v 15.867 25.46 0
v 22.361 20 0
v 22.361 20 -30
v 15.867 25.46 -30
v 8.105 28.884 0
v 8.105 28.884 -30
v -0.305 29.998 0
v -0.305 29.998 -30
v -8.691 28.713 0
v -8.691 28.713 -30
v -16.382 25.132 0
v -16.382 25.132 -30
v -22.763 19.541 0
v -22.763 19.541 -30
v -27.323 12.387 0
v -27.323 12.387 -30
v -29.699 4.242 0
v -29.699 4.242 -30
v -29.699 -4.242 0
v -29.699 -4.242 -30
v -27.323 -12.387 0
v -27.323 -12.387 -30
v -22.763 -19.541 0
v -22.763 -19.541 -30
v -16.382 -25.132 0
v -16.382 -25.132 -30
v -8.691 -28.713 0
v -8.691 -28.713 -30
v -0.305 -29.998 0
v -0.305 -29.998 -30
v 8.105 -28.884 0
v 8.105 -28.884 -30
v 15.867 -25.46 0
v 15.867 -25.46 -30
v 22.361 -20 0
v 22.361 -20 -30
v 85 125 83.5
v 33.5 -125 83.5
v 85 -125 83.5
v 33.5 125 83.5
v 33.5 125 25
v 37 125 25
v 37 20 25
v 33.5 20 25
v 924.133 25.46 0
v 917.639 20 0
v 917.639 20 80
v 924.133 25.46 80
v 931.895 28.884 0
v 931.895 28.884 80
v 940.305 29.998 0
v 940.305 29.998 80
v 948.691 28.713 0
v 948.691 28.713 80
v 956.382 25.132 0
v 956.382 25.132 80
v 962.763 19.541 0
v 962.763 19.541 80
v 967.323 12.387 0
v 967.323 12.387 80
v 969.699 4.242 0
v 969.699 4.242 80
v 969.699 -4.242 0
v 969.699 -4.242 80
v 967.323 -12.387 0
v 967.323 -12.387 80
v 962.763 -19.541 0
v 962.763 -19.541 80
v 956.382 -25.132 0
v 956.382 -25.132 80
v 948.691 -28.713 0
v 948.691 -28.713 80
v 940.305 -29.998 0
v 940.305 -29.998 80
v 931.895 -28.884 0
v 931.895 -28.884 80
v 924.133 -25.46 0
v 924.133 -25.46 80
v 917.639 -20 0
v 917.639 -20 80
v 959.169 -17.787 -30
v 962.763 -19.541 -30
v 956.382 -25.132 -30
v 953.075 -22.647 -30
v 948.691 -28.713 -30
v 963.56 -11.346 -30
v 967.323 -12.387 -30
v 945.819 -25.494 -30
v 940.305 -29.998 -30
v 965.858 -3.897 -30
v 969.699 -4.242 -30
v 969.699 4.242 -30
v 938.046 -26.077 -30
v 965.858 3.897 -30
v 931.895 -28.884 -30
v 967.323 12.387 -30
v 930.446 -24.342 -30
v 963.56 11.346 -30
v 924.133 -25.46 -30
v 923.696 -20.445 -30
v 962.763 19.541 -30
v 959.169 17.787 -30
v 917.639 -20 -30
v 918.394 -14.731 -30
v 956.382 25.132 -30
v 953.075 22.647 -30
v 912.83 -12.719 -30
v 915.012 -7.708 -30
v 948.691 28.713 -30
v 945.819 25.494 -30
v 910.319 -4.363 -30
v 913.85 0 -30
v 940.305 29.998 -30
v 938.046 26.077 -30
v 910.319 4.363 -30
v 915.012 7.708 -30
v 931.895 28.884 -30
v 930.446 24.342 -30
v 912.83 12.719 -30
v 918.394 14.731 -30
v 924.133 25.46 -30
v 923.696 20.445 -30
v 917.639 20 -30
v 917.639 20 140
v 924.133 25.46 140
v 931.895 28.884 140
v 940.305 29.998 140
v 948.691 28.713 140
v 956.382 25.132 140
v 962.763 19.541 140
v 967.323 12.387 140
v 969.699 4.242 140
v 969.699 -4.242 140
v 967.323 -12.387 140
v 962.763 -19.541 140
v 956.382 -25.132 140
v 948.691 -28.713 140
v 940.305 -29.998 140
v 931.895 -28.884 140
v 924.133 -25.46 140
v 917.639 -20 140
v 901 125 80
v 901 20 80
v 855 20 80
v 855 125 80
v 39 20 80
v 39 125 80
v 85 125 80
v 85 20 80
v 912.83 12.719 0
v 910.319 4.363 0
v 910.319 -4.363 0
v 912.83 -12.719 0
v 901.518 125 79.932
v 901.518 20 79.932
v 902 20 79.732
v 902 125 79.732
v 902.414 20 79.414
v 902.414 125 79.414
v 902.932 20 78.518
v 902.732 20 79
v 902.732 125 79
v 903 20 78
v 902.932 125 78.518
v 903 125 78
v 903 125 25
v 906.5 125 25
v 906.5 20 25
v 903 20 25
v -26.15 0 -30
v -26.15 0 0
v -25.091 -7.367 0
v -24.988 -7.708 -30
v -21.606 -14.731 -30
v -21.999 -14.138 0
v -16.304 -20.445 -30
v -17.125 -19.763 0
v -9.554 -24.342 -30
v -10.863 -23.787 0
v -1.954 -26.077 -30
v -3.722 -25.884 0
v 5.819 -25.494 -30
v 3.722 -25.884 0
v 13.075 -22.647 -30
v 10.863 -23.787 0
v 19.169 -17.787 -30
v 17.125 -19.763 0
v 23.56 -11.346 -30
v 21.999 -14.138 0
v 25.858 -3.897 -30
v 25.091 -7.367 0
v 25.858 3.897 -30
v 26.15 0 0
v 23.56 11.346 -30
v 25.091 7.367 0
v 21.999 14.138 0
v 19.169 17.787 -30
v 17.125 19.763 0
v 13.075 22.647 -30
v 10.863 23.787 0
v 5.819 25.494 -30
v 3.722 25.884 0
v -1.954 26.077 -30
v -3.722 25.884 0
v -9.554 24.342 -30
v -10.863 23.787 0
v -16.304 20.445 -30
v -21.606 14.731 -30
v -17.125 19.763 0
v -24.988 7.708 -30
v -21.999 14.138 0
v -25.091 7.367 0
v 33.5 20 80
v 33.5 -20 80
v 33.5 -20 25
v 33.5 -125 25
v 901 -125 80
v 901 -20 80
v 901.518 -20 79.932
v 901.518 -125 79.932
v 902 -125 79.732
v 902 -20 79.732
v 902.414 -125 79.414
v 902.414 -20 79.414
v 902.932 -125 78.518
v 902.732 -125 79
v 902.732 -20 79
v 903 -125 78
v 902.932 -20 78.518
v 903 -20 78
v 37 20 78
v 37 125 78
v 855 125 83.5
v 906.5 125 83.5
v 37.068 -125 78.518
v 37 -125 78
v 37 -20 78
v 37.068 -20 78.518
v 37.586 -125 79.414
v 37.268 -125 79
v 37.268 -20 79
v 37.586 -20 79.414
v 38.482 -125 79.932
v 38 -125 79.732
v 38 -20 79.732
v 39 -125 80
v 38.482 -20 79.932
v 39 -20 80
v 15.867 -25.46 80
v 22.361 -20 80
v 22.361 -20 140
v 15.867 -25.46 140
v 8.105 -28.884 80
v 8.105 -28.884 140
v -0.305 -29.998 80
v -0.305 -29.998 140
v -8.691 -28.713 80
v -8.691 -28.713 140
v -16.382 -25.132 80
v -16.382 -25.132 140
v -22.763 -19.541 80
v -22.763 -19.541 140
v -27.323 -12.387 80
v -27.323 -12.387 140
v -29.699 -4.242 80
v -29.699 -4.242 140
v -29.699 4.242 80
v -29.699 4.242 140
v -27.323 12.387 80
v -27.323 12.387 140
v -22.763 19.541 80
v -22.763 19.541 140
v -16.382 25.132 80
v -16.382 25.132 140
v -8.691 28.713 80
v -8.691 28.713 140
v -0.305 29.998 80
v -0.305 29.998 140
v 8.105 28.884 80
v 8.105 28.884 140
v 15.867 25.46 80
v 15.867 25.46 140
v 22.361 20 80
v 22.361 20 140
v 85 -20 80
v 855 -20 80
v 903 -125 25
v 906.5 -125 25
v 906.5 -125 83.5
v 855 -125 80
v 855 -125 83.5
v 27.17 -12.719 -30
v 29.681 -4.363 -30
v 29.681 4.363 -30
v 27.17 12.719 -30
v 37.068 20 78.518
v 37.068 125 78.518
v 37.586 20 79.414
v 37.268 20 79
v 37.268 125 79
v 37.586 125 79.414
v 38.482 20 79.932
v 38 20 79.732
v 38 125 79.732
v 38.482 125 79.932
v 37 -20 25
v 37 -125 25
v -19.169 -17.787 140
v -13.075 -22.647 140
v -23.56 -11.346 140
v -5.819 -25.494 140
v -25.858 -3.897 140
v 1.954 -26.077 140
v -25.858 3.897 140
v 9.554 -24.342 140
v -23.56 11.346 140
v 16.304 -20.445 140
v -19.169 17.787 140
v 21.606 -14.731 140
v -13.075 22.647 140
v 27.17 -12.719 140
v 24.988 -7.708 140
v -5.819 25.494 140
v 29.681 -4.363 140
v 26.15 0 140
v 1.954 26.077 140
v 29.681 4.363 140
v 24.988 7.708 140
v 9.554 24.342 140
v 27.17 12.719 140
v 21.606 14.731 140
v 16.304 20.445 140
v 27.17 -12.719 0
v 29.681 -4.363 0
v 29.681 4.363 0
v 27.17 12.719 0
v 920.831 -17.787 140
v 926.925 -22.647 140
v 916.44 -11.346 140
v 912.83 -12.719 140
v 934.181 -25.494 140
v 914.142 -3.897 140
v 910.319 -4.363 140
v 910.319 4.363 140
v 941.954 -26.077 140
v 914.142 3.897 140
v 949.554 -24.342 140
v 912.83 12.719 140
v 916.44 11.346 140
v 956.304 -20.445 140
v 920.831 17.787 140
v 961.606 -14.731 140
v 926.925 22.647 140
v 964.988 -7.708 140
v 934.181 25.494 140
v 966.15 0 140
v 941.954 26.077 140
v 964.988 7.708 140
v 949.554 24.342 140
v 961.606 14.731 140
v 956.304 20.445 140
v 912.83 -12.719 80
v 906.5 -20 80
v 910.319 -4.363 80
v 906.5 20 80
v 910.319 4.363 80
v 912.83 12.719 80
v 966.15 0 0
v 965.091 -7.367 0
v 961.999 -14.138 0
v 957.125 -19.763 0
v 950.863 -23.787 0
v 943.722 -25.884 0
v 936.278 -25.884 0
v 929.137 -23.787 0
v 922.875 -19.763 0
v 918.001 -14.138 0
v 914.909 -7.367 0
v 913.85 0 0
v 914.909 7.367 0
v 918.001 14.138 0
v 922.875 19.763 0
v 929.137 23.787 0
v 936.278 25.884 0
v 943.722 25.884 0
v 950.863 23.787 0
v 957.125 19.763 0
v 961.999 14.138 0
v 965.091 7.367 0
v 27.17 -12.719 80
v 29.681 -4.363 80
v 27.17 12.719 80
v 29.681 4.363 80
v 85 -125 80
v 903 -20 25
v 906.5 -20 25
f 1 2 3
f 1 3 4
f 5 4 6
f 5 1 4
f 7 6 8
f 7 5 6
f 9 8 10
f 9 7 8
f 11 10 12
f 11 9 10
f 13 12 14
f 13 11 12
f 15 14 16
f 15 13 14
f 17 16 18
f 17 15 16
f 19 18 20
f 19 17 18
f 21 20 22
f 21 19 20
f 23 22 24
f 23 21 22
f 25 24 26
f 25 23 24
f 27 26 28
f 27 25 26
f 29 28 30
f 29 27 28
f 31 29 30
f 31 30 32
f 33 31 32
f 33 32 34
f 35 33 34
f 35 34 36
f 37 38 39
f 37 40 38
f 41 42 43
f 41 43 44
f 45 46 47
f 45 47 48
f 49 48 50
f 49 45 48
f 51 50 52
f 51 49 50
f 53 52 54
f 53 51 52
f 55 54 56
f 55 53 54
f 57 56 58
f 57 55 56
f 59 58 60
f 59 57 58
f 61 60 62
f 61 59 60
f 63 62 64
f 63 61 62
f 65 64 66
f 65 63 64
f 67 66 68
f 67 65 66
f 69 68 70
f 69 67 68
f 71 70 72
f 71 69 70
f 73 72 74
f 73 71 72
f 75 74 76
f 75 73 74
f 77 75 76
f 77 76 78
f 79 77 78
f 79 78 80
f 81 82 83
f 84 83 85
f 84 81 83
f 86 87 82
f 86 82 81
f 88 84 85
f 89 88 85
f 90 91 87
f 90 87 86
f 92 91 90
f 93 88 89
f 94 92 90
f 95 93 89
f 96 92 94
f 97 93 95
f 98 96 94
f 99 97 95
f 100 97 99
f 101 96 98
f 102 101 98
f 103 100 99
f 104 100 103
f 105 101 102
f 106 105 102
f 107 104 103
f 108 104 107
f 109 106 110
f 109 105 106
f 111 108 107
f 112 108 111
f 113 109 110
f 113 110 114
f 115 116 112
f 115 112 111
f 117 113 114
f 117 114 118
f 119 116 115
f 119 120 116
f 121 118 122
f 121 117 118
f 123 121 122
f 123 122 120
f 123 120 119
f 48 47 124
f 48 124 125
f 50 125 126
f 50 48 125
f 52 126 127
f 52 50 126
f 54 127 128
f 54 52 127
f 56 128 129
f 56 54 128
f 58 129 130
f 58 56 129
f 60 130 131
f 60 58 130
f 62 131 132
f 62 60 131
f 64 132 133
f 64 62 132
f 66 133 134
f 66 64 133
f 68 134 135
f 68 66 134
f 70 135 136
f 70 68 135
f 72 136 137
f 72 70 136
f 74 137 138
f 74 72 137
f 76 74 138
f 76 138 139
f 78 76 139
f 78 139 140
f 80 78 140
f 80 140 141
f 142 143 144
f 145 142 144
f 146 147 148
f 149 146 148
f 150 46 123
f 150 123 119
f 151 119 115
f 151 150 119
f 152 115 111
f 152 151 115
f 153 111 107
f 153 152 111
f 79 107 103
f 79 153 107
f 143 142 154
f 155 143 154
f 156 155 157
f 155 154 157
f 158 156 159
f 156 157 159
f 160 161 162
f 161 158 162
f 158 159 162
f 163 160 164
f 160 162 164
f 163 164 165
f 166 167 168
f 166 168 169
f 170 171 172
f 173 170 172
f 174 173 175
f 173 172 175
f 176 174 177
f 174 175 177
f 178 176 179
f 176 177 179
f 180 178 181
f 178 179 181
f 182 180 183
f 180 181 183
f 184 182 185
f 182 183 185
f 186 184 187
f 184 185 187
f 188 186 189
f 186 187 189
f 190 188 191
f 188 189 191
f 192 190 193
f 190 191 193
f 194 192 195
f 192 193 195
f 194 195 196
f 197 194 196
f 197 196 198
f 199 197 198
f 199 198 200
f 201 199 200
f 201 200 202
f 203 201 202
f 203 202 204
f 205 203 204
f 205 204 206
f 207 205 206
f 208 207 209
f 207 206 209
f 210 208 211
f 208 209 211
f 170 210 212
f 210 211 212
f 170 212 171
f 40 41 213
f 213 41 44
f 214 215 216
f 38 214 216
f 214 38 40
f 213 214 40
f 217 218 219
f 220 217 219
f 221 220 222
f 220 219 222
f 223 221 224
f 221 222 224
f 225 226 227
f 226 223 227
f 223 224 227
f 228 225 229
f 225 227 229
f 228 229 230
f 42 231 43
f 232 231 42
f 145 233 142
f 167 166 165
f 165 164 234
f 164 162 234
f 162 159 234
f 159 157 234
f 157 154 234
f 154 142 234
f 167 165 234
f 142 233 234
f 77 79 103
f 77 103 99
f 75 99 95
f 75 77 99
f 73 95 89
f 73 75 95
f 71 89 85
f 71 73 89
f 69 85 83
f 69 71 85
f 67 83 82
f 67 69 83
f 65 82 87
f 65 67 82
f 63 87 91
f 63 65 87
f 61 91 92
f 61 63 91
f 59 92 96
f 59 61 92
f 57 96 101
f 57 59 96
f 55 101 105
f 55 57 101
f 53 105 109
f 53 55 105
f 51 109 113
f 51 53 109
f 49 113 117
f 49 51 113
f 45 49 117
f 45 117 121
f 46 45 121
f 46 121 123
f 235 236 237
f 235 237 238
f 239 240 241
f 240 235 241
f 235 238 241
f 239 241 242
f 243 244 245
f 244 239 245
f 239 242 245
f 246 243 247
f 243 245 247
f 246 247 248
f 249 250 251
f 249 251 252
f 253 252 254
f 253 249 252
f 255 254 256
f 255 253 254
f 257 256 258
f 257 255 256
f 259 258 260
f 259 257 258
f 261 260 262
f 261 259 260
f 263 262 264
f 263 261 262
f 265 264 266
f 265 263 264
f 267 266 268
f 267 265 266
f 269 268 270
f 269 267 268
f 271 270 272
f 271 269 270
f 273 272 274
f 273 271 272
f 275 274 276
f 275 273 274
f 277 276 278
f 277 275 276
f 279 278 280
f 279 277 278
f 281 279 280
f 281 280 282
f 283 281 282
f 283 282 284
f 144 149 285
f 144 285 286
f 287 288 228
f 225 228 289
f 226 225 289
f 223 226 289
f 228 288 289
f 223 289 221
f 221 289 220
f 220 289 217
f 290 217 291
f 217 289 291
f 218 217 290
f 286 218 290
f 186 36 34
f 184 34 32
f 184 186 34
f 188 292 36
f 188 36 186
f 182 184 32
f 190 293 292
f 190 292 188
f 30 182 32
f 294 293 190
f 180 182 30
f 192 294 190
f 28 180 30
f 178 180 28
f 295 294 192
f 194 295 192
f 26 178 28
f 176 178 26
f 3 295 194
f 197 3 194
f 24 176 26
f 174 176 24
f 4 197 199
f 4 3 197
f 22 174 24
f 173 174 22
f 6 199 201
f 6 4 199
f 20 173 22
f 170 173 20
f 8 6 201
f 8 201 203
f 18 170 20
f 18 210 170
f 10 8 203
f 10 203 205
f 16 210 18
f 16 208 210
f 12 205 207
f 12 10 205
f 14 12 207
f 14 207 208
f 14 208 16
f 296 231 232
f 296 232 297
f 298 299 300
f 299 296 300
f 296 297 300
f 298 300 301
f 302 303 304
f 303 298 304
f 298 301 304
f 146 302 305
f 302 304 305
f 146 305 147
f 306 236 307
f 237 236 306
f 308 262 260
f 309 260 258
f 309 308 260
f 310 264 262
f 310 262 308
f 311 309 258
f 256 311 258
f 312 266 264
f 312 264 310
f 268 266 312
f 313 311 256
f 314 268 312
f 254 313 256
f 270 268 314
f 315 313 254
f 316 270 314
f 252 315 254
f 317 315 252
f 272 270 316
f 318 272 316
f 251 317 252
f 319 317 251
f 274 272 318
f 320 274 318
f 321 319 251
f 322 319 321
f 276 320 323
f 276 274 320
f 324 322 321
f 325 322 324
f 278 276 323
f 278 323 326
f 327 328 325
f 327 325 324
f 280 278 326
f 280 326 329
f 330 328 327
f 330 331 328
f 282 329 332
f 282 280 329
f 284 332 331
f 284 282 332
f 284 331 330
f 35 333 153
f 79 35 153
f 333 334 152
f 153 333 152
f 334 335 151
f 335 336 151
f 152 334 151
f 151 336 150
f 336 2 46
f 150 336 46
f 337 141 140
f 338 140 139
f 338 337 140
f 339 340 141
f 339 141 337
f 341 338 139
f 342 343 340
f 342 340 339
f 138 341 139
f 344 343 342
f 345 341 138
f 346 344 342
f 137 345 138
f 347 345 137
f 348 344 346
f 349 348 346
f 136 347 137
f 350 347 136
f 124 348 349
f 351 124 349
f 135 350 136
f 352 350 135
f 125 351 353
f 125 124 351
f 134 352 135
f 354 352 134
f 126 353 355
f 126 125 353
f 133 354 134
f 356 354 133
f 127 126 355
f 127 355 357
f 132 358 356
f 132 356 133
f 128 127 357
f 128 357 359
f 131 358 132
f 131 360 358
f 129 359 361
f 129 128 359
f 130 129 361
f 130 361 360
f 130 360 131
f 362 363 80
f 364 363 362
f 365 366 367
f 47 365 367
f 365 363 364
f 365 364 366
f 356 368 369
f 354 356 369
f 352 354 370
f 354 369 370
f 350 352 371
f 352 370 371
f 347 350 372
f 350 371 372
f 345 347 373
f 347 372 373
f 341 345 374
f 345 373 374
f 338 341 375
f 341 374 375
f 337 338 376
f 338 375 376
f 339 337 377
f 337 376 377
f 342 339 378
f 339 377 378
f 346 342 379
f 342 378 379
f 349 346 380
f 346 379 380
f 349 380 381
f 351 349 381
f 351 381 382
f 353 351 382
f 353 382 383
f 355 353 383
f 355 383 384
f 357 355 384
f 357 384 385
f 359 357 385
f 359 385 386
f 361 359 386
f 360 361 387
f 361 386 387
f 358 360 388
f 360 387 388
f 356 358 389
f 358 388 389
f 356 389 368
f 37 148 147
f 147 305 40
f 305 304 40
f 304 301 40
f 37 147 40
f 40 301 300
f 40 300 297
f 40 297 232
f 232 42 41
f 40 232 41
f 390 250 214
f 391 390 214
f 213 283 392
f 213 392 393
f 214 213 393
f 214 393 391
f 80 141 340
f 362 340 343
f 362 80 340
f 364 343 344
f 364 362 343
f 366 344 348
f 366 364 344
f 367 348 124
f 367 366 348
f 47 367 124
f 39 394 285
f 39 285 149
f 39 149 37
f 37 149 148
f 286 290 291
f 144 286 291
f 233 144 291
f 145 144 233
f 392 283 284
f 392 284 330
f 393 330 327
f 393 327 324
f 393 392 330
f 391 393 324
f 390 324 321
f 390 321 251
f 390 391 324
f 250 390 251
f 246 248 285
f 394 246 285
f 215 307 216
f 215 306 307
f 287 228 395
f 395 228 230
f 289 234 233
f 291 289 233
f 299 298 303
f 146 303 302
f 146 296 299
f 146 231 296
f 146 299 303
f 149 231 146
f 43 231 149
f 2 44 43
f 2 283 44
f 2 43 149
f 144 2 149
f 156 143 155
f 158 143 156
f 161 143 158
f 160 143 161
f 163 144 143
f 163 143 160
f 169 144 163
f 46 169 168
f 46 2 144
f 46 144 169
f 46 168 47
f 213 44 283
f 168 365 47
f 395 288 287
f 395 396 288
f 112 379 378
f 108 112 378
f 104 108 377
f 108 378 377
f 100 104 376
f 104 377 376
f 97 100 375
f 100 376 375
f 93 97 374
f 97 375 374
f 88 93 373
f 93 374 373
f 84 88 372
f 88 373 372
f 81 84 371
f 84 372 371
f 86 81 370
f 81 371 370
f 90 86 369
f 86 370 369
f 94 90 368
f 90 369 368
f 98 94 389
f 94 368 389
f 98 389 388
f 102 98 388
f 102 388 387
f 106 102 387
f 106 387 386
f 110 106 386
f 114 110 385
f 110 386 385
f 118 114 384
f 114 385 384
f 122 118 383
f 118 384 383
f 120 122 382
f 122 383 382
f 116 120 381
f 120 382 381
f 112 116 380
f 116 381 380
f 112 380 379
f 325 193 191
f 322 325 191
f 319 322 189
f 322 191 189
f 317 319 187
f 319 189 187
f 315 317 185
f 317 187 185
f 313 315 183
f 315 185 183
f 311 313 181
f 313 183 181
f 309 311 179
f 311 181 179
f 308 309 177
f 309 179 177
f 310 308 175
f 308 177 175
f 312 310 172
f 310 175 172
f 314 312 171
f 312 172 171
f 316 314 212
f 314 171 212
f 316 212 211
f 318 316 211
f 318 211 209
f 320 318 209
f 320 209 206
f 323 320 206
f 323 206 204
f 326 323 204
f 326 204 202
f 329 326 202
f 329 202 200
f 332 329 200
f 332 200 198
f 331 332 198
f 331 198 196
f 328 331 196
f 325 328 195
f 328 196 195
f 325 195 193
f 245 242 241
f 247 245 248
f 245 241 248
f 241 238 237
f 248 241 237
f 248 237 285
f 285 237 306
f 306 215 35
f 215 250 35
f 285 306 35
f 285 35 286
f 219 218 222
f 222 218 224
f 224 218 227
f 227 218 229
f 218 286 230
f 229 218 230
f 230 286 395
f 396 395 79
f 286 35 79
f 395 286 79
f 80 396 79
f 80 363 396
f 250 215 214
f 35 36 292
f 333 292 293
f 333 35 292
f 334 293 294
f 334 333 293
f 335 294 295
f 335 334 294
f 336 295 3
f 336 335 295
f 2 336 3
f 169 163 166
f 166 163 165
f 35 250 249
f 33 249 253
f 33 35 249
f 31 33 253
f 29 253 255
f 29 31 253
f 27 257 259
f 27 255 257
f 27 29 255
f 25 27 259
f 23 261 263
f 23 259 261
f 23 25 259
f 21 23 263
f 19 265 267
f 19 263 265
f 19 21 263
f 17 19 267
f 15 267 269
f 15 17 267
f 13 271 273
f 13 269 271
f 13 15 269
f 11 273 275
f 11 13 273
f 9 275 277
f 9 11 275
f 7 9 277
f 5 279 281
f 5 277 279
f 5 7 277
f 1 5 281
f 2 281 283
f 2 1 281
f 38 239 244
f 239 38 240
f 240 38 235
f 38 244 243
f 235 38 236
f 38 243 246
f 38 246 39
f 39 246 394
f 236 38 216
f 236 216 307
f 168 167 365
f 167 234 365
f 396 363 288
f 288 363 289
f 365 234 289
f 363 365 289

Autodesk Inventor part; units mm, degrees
ref_plane "YZ Plane" through (0, 0, 0) normal (1, 0, 0) x (0, 1, 0)
ref_plane "XZ Plane" through (0, 0, 0) normal (0, 1, 0) x (-1, 0, 0)
ref_plane "XY Plane" through (0, 0, 0) normal (0, 0, 1) x (1, 0, 0)
sketch "Boceto1" plane through (0, 0, 0) normal (0, 0, 1) x (1, 0, 0)
  circle A0 centre (0, 0) radius 30
  circle A1 centre (0, 0) radius 26.15
  circle A2 centre (940, 0) radius 30
  circle A3 centre (940, 0) radius 26.15
  line L0 (22.3607, -20) -> (917.6393, -20)
  line L1 (26.15, 0) -> (30, 0)
  line L2 (910, 0) -> (940, 0)
  line L3 (22.3607, 20) -> (917.6393, 20)
  dimension "d1" = 52.3
  dimension "d0" = 60
  dimension "d2" = 940
  dimension "d3" = 60
  dimension "d4" = 52.3
extrude "Extrusión1" add sketch "Boceto1" along normal blind 80
sketch "Boceto2" plane through (0, 0, 80) normal (0, 0, 1) x (1, 0, 0)
  arc A0 (22.3607, 20) -> (22.3607, -20) centre (0, 0) ccw projected
  line L0 (22.3607, -20) -> (917.6393, -20) projected
  arc A1 (917.6393, -20) -> (917.6393, 20) centre (940, 0) ccw projected
  line L1 (917.6393, 20) -> (22.3607, 20) projected
  circle A2 centre (940, 0) radius 26.15 projected
  circle A3 centre (0, 0) radius 26.15 projected
  circle A4 centre (0, 0) radius 30
  circle A5 centre (940, 0) radius 30
  point P0 (917.6393, 20)
  point P1 (22.3607, -20)
extrude "Extrusión2" add sketch "Boceto2" along normal blind 60 contours A4 A0 | A1 A5
sketch "Boceto3" plane through (0, 0, 0) normal (0, 0, -1) x (-1, 0, 0)
  arc A0 (-22.3607, -20) -> (-22.3607, 20) centre (0, 0) ccw projected
  line L0 (-917.6393, 20) -> (-22.3607, 20) projected
  arc A1 (-917.6393, 20) -> (-917.6393, -20) centre (-940, 0) ccw projected
  line L1 (-22.3607, -20) -> (-917.6393, -20) projected
  circle A2 centre (-940, 0) radius 26.15 projected
  circle A3 centre (0, 0) radius 26.15 projected
  circle A4 centre (0, 0) radius 30
  arc A5 (-917.6393, 20) -> (-917.6393, -20) centre (-940, 0) ccw projected
  circle A6 centre (-940, 0) radius 30
  point P0 (-22.3607, 20)
extrude "Extrusión3" add sketch "Boceto3" along normal blind 30 contours A4 A0 | A1 A6
sketch "Boceto7" plane through (0, 0, 80) normal (0, 0, 1) x (1, 0, 0)
  line L0 (85, 125) -> (30, 125) projected
  line L1 (85, 20) -> (85, 125) projected
  line L2 (33.5, 125) -> (33.5, -125) projected
  line L3 (30, -125) -> (85, -125) projected
  line L4 (33.5, 125) -> (85, 125)
  line L5 (85, 125) -> (85, -125)
  line L6 (85, -125) -> (33.5, -125)
  line L7 (33.5, -125) -> (33.5, 125)
  point P0 (0, 0)
extrude "Extrusión7" add sketch "Boceto7" along normal blind 3.5
sketch "Boceto8" plane through (0, 0, 80) normal (0, 0, -1) x (-1, 0, 0)
  line L0 (-33.5, -20) -> (-85, -20) projected
  line L1 (-85, -125) -> (-85, -20) projected
  line L2 (-33.5, -125) -> (-85, -125) projected
  line L3 (-33.5, -20) -> (-33.5, -125) projected
  line L4 (-85, 20) -> (-33.5, 20) projected
  line L5 (-33.5, 125) -> (-33.5, 20) projected
  line L6 (-85, 125) -> (-33.5, 125) projected
  line L7 (-85, 20) -> (-85, 125) projected
  line L8 (-33.5, 125) -> (-33.5, -125) projected
  line L9 (-85, 125) -> (-33.5, 125) projected
  line L10 (-33.5, -125) -> (-37, -125)
  line L11 (-37, -125) -> (-37, 125)
  line L12 (-37, 125) -> (-33.5, 125)
  line L13 (-33.5, 125) -> (-33.5, -125)
  line L14 (-917.6393, 20) -> (-22.3607, 20) projected
  line L15 (-470, 20) -> (-470, -237.5428)
  line L16 (-906.5, -20) -> (-855, -20)
  line L17 (-855, -125) -> (-855, -20)
  line L18 (-906.5, -125) -> (-855, -125)
  line L19 (-906.5, -20) -> (-906.5, -125)
  line L20 (-855, 20) -> (-906.5, 20)
  line L21 (-906.5, 125) -> (-906.5, 20)
  line L22 (-855, 125) -> (-906.5, 125)
  line L23 (-855, 20) -> (-855, 125)
  line L24 (-906.5, 125) -> (-906.5, -125)
  line L25 (-855, 125) -> (-906.5, 125)
  line L26 (-906.5, -125) -> (-903, -125)
  line L27 (-903, -125) -> (-903, 125)
  line L28 (-903, 125) -> (-906.5, 125)
  line L29 (-906.5, 125) -> (-906.5, -125)
  line L30 (-855, 125) -> (-903, 125)
  line L31 (-903, 125) -> (-903, -125)
  line L32 (-903, -125) -> (-855, -125)
  line L33 (-855, -125) -> (-855, 125)
  point P0 (0, 0)
  point P1 (-37, 20)
  point P2 (-37, -20)
  point P3 (-903, 20)
  point P4 (-903, -20)
  dimension "d26" = 3.5
extrude "Extrusión8" add sketch "Boceto8" along normal blind 55 contours L3 L2 L11 L0 | L4 L11 L6 L5
fillet "Empalme3" radius 2 2 edges at (37, -72.5, 80) (37, 72.5, 80)
extrude "Extrusión9" add sketch "Boceto8" against normal blind 3.5 contours L33 L16 L27 L14 | L14 L27 L22 L23 | L27 L16 L24 L14 | L14 L21 L22 L27 | L17 L18 L27 L16 | L27 L18 L19 L16
extrude "Extrusión10" add sketch "Boceto8" along normal blind 55 contours L14 L21 L22 L27 | L27 L18 L19 L16
fillet "Empalme4" radius 2 2 edges at (903, -72.5, 80) (903, 72.5, 80)
properties part number "bocina2"
